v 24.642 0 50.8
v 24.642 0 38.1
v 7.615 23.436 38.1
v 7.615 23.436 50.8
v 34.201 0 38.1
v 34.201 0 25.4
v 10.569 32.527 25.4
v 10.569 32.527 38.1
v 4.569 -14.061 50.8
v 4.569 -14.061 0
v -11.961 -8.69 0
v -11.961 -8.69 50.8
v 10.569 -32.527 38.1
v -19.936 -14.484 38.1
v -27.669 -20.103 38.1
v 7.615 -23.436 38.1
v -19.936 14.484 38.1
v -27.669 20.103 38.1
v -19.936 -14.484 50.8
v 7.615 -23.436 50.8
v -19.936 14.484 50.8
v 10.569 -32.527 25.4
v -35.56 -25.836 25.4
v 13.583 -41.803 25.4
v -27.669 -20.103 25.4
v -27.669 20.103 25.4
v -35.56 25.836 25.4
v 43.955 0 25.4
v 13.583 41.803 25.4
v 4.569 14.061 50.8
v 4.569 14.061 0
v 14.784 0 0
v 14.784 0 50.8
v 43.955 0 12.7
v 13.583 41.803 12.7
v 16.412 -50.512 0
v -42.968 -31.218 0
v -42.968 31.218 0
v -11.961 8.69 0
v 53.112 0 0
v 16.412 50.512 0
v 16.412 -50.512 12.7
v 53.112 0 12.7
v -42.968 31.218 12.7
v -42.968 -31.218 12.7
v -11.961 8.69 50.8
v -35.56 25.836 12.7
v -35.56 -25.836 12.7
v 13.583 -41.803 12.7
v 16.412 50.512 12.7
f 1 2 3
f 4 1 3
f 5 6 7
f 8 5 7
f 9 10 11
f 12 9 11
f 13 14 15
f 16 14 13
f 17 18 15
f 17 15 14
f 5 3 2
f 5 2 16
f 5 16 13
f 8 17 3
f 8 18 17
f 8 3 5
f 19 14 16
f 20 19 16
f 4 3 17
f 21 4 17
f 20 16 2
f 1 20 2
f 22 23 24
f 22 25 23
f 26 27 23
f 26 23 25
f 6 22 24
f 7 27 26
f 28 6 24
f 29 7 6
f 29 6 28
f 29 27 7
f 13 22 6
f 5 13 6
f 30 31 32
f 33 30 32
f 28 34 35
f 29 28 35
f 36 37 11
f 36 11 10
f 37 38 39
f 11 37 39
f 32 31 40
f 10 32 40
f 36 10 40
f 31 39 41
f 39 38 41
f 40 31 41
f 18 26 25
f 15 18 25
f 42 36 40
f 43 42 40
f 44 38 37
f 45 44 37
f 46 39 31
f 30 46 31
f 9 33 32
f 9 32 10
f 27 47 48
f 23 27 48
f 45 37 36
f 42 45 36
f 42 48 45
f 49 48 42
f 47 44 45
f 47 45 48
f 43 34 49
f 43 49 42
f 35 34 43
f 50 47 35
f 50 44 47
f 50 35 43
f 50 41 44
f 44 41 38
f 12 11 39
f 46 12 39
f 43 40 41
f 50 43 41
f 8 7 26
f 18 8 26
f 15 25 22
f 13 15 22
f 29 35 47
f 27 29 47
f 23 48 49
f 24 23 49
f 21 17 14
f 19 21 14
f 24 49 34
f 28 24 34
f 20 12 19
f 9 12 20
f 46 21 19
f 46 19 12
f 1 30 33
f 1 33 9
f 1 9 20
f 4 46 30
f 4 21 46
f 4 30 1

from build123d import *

# Parameters (mm, degrees)
F1_DEPTH = 12.7
F2_DEPTH = 25.4
F3_DEPTH = 38.1
F4_DEPTH = 50.8


with BuildPart() as f1:
    # F0 (on Top) → F1 (new body)
    with BuildSketch(Plane.XY):
        Polygon((-42.968333, 31.218321), (-42.968333, -31.218321), (16.412443, -50.512305), (53.11178, 0), (16.412443, 50.512305), align=None)
        Polygon((13.582712, -41.803288), (-35.560001, -25.835853), (-35.560001, 25.835853), (13.582712, 41.803288), (43.954578, 0), align=None, mode=Mode.SUBTRACT)
    extrude(amount=F1_DEPTH)

    # F0 (on Top) → F2 (join)
    with BuildSketch(Plane.XY):
        Polygon((-35.560001, 25.835853), (-35.560001, -25.835853), (13.582712, -41.803288), (43.954578, 0), (13.582712, 41.803288), align=None)
        Polygon((10.568597, 32.526797), (34.200698, 0), (10.568597, -32.526797), (-27.668946, -20.102666), (-27.668946, 20.102666), align=None, mode=Mode.SUBTRACT)
    extrude(amount=F2_DEPTH)

    # F0 (on Top) → F3 (join)
    with BuildSketch(Plane.XY):
        Polygon((10.568597, -32.526797), (34.200698, 0), (10.568597, 32.526797), (-27.668946, 20.102666), (-27.668946, -20.102666), align=None)
        Polygon((7.614722, 23.435704), (24.641757, 0), (7.614722, -23.435704), (-19.9356, -14.484062), (-19.9356, 14.484062), align=None, mode=Mode.SUBTRACT)
    extrude(amount=F3_DEPTH)

    # F0 (on Top) → F4 (join)
    with BuildSketch(Plane.XY):
        Polygon((7.614722, -23.435704), (24.641757, 0), (7.614722, 23.435704), (-19.9356, 14.484062), (-19.9356, -14.484062), align=None)
        Polygon((4.568539, 14.060516), (14.784101, 0), (4.568539, -14.060516), (-11.960589, -8.689877), (-11.960589, 8.689877), align=None, mode=Mode.SUBTRACT)
    extrude(amount=F4_DEPTH)


solid = f1.part
